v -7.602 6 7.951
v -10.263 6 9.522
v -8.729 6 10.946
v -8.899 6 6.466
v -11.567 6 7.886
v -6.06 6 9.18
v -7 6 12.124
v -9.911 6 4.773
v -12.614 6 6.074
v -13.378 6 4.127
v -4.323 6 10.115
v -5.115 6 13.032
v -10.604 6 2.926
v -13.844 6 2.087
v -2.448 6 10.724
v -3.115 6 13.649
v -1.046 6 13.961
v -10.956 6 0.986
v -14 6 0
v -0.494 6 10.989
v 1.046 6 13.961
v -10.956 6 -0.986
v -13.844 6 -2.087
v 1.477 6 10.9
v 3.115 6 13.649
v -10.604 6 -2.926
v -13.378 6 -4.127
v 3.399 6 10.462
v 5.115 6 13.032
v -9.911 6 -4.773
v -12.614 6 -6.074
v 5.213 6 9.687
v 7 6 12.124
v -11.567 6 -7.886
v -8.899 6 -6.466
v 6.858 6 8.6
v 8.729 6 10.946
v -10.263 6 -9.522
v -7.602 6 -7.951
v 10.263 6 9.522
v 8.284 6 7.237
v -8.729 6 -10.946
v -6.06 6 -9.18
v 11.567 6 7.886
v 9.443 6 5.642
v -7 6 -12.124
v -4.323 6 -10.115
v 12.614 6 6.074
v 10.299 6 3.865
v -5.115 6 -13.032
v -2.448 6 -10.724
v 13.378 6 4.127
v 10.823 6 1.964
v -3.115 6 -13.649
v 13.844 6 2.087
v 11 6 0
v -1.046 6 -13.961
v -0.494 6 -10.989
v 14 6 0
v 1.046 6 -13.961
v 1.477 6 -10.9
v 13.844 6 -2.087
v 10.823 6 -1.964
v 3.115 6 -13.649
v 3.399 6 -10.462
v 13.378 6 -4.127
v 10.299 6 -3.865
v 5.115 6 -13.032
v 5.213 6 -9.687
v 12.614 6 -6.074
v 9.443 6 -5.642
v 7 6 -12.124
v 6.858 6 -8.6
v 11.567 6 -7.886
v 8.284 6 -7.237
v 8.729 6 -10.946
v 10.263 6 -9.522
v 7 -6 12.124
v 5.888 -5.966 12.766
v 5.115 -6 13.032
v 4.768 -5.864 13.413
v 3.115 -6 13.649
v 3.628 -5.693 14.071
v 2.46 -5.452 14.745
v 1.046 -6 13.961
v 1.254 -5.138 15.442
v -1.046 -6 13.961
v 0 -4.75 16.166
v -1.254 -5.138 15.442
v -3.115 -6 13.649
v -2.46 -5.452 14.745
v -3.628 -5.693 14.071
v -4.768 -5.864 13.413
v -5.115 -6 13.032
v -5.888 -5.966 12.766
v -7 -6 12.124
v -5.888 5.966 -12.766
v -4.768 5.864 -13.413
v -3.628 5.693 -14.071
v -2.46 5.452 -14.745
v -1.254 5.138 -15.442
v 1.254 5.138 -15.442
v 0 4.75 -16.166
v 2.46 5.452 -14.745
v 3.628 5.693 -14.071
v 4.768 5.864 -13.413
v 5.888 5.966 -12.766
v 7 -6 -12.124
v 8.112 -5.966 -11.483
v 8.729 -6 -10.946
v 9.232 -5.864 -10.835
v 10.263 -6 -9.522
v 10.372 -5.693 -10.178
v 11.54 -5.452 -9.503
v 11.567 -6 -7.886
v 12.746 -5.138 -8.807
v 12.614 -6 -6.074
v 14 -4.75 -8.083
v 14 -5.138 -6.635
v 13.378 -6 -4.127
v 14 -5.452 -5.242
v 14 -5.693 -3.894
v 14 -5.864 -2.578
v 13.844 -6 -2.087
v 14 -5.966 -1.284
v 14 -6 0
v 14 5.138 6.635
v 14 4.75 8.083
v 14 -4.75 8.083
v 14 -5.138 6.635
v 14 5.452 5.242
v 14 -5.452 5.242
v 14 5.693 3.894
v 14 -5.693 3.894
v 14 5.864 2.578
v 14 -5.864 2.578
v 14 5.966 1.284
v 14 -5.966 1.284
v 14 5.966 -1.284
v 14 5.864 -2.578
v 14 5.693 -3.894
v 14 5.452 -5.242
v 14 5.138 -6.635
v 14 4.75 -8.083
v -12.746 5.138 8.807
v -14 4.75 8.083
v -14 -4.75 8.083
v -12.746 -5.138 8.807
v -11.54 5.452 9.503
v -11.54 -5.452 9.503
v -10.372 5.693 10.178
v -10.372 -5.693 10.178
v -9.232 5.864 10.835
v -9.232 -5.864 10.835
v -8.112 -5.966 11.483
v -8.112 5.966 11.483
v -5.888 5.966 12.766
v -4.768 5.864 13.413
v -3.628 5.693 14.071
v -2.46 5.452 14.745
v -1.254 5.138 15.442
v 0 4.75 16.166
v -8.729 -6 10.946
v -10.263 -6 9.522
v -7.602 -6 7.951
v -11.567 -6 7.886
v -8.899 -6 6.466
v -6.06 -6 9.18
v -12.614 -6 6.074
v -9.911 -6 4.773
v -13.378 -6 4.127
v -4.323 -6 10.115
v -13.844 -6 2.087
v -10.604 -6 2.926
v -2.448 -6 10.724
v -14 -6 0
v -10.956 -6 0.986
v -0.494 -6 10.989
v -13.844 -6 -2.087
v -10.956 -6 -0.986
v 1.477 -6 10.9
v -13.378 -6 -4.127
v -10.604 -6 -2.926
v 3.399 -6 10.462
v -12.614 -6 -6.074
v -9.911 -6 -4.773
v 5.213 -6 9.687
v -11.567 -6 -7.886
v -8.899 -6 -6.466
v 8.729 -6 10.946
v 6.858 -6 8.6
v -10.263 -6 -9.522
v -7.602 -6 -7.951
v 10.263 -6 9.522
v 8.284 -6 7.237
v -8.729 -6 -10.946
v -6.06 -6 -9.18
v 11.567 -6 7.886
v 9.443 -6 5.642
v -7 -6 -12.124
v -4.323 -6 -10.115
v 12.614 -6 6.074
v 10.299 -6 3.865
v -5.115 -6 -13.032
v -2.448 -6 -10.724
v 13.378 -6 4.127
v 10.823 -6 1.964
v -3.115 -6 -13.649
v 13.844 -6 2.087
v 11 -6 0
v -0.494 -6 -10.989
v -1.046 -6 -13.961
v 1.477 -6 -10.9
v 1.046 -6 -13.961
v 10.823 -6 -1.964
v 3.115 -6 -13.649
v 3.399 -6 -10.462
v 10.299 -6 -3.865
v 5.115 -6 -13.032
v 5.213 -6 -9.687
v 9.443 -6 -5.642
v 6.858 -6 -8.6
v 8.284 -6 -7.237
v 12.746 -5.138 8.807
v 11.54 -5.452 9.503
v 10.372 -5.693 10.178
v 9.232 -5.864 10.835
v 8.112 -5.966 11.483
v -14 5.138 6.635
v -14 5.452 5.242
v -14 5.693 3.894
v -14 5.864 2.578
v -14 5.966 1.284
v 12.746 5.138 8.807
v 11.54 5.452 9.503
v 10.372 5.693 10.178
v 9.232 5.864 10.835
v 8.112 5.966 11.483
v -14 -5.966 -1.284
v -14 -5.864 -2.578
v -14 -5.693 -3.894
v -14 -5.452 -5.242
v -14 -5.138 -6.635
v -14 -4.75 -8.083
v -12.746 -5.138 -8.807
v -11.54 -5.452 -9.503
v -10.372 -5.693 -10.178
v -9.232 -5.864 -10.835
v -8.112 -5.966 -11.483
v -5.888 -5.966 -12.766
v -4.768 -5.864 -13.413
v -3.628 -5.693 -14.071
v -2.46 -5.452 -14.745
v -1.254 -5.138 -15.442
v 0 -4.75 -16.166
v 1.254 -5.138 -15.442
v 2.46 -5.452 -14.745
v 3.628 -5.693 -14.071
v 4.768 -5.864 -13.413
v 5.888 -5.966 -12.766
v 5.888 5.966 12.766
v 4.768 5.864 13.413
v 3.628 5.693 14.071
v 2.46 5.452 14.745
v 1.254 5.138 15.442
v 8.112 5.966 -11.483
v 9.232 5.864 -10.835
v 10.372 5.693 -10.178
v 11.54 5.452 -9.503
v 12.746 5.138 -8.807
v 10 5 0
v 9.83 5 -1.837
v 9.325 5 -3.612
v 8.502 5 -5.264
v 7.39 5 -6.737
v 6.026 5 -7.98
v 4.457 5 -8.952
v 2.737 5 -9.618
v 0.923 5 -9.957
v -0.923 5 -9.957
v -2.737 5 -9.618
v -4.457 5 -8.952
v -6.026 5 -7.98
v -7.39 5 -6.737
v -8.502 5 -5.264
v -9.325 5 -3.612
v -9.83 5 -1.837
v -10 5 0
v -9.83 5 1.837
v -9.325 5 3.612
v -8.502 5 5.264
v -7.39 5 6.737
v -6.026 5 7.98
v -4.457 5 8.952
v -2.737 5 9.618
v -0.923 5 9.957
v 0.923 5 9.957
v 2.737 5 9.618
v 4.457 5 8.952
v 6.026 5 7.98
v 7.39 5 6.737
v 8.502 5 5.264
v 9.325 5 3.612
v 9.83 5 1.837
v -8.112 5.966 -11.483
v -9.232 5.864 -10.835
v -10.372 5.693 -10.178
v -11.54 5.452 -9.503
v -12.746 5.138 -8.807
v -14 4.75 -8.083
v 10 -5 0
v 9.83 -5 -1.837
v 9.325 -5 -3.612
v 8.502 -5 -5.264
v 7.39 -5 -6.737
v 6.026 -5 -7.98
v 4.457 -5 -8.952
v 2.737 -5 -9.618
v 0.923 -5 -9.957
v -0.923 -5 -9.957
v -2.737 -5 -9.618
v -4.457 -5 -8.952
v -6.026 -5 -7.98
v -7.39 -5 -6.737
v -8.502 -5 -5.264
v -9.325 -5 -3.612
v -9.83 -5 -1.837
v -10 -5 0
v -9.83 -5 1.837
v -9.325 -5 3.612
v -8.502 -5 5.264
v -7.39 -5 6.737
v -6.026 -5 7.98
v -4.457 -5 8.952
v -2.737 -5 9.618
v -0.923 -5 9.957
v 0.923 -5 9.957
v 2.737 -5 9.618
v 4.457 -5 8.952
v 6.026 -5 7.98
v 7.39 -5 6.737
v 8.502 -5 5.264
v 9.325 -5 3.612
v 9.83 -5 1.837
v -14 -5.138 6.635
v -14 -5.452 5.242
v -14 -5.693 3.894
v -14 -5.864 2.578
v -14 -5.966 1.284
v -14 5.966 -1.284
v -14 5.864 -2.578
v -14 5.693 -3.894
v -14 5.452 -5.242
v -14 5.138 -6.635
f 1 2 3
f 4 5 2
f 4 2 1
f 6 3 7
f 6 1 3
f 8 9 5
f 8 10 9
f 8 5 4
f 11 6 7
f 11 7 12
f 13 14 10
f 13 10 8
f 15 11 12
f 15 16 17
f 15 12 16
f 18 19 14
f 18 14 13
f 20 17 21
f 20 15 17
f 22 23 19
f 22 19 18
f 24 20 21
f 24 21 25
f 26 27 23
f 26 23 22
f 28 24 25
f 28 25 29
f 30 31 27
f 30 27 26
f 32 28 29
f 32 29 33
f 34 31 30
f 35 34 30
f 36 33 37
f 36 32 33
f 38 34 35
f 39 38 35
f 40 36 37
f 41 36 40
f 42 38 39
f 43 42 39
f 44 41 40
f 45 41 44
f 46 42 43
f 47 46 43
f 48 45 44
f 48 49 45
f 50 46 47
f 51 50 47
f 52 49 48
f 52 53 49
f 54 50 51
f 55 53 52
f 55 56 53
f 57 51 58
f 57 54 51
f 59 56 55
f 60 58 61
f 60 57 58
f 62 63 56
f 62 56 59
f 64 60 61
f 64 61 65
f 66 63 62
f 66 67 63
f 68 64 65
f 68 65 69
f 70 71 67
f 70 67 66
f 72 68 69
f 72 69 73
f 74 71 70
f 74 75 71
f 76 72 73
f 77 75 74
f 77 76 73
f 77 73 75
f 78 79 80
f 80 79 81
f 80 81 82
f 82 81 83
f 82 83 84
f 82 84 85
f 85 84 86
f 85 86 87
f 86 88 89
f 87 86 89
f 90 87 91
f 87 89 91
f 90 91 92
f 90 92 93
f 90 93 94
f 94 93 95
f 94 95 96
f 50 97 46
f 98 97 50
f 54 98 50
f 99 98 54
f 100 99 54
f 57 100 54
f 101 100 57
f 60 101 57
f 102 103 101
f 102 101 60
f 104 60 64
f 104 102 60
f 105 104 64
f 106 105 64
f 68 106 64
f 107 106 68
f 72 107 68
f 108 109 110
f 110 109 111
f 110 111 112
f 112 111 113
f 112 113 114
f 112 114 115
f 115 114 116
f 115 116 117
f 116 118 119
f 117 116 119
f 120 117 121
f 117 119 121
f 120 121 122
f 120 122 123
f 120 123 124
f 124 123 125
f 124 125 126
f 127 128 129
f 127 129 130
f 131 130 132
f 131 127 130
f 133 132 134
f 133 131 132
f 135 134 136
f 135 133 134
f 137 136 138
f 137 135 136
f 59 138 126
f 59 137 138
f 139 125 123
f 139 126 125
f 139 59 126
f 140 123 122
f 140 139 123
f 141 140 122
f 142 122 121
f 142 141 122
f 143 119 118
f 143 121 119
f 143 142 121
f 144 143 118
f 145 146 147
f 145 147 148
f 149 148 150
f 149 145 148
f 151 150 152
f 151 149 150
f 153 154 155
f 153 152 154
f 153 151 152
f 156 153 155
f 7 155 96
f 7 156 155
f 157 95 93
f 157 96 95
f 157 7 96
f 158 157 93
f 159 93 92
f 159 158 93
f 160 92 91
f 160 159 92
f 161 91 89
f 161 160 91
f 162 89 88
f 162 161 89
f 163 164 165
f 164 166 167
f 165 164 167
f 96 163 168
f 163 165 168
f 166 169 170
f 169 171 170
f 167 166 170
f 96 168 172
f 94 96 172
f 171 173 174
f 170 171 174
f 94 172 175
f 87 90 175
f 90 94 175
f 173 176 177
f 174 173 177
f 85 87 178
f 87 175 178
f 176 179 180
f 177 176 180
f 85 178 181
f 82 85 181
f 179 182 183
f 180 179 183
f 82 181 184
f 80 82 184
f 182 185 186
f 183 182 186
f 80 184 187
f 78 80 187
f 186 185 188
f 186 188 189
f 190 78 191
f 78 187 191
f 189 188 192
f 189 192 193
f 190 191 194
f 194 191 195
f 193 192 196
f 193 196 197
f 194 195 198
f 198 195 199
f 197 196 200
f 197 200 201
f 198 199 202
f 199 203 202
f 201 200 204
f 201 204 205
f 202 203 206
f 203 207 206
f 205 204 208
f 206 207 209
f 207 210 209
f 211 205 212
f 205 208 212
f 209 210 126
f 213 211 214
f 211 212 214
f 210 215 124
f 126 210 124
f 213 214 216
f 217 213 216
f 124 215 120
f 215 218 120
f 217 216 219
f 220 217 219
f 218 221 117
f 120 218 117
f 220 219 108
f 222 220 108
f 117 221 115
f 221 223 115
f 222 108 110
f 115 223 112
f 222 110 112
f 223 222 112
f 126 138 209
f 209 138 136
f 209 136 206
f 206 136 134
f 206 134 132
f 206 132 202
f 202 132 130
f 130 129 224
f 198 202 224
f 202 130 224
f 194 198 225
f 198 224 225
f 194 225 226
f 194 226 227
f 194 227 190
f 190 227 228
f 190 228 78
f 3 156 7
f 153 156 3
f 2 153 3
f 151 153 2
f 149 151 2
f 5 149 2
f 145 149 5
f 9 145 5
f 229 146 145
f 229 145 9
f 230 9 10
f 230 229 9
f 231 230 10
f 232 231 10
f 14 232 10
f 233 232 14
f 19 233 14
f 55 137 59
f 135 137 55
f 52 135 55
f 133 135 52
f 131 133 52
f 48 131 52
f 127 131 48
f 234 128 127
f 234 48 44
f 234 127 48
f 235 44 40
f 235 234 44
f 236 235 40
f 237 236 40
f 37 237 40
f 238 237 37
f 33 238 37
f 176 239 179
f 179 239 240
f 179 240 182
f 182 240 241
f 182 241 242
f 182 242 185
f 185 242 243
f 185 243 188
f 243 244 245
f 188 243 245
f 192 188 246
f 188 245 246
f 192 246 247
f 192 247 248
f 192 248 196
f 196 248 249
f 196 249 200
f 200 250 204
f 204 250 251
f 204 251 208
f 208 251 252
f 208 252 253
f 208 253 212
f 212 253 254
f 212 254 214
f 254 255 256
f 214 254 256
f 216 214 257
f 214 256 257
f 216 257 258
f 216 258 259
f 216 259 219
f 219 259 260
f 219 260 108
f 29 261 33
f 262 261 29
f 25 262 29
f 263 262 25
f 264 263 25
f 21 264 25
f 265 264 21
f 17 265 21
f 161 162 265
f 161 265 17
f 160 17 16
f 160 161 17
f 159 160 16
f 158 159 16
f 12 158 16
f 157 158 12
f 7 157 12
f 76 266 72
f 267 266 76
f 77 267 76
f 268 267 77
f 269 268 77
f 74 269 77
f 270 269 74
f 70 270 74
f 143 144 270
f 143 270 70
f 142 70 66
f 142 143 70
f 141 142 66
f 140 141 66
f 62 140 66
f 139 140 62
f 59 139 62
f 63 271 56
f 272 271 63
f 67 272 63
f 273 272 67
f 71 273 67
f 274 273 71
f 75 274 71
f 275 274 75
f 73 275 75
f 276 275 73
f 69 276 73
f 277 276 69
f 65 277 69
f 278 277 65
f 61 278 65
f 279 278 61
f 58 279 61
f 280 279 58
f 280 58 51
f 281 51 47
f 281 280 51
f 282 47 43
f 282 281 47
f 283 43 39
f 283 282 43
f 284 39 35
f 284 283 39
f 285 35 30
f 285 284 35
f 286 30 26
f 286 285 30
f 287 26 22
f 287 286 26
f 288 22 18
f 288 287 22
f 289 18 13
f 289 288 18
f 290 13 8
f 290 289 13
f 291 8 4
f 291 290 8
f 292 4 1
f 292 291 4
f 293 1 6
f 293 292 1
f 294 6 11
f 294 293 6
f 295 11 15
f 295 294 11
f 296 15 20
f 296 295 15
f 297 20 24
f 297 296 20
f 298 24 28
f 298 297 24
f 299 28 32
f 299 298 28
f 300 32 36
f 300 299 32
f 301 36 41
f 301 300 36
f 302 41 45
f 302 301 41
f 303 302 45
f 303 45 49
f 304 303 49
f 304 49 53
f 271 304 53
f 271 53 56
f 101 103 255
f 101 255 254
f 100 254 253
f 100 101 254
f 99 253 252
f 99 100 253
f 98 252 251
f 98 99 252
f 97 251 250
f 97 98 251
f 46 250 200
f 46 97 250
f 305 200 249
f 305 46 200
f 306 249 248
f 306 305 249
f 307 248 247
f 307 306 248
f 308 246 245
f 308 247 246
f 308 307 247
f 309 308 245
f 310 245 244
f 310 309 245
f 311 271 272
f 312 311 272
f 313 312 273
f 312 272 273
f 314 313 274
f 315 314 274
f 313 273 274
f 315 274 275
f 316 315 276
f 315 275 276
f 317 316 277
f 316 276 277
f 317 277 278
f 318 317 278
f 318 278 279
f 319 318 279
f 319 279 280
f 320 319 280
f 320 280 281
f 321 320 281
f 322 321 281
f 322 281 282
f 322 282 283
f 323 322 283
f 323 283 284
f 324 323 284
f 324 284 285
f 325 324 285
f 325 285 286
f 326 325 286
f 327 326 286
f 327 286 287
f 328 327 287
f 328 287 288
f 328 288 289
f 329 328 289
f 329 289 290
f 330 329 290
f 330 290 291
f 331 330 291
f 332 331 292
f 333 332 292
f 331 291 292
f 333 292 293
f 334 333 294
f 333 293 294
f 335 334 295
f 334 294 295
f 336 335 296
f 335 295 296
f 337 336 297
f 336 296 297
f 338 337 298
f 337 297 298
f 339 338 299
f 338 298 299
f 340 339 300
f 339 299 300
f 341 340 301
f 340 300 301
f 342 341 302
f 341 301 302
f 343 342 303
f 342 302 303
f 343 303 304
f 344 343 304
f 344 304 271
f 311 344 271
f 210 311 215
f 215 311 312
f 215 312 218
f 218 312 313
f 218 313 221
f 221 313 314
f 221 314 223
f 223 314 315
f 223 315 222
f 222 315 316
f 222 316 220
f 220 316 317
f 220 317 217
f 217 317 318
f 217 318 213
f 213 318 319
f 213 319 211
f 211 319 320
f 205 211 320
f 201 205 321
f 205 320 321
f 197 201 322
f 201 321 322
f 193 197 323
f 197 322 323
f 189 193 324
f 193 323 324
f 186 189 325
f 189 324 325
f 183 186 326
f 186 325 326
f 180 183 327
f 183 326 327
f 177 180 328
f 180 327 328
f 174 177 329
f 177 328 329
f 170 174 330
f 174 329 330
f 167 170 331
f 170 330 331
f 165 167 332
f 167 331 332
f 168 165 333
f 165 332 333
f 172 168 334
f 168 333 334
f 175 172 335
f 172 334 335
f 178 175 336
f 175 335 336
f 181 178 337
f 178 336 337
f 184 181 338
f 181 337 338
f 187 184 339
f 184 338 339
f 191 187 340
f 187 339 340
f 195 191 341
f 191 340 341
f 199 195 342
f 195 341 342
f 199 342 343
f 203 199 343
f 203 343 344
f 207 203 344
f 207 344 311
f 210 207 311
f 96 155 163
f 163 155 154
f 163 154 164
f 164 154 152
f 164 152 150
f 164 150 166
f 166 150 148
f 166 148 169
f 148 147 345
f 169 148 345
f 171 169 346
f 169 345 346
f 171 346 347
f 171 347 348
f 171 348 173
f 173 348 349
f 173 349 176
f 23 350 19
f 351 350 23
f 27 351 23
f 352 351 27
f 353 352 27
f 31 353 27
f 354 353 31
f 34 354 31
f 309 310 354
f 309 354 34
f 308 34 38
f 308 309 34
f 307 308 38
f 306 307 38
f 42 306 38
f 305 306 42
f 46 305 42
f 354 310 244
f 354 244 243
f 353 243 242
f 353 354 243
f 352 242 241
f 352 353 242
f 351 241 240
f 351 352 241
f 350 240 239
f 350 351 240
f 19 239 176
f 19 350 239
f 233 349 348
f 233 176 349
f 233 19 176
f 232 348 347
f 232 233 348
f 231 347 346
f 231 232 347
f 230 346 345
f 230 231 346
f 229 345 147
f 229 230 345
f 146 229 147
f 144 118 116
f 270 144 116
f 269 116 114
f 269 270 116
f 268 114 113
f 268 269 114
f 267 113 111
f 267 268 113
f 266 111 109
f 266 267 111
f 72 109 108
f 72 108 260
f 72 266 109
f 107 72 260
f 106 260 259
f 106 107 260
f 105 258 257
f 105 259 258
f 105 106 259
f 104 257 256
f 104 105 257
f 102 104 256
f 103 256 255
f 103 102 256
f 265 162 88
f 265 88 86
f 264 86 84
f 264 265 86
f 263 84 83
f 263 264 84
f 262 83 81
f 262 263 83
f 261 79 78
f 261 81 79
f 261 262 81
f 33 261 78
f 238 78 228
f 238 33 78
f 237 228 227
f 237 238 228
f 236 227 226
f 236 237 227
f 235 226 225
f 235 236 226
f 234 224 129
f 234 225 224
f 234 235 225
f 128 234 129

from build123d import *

# Parameters (mm, degrees)
BOSS_EXTRUDE1_DEPTH = 6
SKETCH2_OUTSIDE_W   = 80.454
SKETCH2_OUTSIDE_H   = 84.786
SKETCH2_OUTSIDE_R   = 14
CUT_EXTRUDE1_DEPTH  = 12
CUT_EXTRUDE1_TAPER  = 60
SKETCH3_R           = 10
CUT_EXTRUDE2_DEPTH  = 13
CHAMFER1_SIZE       = 1


with BuildPart() as part:
    # Sketch1 → Boss-Extrude1 (new body, symmetric)
    with BuildSketch(Plane(origin=(0, 0, 0), x_dir=(1, 0, 0), z_dir=(0, 1, 0))):
        Polygon((14, 8.082903769), (0, 16.165807537), (-14, 8.082903769), (-14, -8.082903769), (0, -16.165807537), (14, -8.082903769), align=None)
    extrude(amount=BOSS_EXTRUDE1_DEPTH, both=True)

    # Sketch2 outside → Cut-Extrude1 (cut)
    with BuildSketch(Plane(origin=(0, 6, 0), x_dir=(1, 0, 0), z_dir=(0, 1, 0))):
        Rectangle(SKETCH2_OUTSIDE_W, SKETCH2_OUTSIDE_H)
        Circle(SKETCH2_OUTSIDE_R, mode=Mode.SUBTRACT)
    cut_extrude1 = extrude(amount=-CUT_EXTRUDE1_DEPTH, taper=CUT_EXTRUDE1_TAPER, mode=Mode.SUBTRACT)

    # Mirror1: Cut-Extrude1 across plane
    add(cut_extrude1.mirror(Plane.ZX), mode=Mode.SUBTRACT)

    # Sketch3 → Cut-Extrude2 (cut, through all)
    with BuildSketch(Plane(origin=(0, 6, 0), x_dir=(1, 0, 0), z_dir=(0, 1, 0))):
        Circle(SKETCH3_R)
    extrude(amount=-CUT_EXTRUDE2_DEPTH, mode=Mode.SUBTRACT)

    # Chamfer1
    chamfer1_edges = [part.edges().sort_by_distance(p)[0] for p in [
        (-10, -6, 0),
        (-10, 6, 0),
    ]]
    chamfer(chamfer1_edges, length=CHAMFER1_SIZE)


solid = part.part
